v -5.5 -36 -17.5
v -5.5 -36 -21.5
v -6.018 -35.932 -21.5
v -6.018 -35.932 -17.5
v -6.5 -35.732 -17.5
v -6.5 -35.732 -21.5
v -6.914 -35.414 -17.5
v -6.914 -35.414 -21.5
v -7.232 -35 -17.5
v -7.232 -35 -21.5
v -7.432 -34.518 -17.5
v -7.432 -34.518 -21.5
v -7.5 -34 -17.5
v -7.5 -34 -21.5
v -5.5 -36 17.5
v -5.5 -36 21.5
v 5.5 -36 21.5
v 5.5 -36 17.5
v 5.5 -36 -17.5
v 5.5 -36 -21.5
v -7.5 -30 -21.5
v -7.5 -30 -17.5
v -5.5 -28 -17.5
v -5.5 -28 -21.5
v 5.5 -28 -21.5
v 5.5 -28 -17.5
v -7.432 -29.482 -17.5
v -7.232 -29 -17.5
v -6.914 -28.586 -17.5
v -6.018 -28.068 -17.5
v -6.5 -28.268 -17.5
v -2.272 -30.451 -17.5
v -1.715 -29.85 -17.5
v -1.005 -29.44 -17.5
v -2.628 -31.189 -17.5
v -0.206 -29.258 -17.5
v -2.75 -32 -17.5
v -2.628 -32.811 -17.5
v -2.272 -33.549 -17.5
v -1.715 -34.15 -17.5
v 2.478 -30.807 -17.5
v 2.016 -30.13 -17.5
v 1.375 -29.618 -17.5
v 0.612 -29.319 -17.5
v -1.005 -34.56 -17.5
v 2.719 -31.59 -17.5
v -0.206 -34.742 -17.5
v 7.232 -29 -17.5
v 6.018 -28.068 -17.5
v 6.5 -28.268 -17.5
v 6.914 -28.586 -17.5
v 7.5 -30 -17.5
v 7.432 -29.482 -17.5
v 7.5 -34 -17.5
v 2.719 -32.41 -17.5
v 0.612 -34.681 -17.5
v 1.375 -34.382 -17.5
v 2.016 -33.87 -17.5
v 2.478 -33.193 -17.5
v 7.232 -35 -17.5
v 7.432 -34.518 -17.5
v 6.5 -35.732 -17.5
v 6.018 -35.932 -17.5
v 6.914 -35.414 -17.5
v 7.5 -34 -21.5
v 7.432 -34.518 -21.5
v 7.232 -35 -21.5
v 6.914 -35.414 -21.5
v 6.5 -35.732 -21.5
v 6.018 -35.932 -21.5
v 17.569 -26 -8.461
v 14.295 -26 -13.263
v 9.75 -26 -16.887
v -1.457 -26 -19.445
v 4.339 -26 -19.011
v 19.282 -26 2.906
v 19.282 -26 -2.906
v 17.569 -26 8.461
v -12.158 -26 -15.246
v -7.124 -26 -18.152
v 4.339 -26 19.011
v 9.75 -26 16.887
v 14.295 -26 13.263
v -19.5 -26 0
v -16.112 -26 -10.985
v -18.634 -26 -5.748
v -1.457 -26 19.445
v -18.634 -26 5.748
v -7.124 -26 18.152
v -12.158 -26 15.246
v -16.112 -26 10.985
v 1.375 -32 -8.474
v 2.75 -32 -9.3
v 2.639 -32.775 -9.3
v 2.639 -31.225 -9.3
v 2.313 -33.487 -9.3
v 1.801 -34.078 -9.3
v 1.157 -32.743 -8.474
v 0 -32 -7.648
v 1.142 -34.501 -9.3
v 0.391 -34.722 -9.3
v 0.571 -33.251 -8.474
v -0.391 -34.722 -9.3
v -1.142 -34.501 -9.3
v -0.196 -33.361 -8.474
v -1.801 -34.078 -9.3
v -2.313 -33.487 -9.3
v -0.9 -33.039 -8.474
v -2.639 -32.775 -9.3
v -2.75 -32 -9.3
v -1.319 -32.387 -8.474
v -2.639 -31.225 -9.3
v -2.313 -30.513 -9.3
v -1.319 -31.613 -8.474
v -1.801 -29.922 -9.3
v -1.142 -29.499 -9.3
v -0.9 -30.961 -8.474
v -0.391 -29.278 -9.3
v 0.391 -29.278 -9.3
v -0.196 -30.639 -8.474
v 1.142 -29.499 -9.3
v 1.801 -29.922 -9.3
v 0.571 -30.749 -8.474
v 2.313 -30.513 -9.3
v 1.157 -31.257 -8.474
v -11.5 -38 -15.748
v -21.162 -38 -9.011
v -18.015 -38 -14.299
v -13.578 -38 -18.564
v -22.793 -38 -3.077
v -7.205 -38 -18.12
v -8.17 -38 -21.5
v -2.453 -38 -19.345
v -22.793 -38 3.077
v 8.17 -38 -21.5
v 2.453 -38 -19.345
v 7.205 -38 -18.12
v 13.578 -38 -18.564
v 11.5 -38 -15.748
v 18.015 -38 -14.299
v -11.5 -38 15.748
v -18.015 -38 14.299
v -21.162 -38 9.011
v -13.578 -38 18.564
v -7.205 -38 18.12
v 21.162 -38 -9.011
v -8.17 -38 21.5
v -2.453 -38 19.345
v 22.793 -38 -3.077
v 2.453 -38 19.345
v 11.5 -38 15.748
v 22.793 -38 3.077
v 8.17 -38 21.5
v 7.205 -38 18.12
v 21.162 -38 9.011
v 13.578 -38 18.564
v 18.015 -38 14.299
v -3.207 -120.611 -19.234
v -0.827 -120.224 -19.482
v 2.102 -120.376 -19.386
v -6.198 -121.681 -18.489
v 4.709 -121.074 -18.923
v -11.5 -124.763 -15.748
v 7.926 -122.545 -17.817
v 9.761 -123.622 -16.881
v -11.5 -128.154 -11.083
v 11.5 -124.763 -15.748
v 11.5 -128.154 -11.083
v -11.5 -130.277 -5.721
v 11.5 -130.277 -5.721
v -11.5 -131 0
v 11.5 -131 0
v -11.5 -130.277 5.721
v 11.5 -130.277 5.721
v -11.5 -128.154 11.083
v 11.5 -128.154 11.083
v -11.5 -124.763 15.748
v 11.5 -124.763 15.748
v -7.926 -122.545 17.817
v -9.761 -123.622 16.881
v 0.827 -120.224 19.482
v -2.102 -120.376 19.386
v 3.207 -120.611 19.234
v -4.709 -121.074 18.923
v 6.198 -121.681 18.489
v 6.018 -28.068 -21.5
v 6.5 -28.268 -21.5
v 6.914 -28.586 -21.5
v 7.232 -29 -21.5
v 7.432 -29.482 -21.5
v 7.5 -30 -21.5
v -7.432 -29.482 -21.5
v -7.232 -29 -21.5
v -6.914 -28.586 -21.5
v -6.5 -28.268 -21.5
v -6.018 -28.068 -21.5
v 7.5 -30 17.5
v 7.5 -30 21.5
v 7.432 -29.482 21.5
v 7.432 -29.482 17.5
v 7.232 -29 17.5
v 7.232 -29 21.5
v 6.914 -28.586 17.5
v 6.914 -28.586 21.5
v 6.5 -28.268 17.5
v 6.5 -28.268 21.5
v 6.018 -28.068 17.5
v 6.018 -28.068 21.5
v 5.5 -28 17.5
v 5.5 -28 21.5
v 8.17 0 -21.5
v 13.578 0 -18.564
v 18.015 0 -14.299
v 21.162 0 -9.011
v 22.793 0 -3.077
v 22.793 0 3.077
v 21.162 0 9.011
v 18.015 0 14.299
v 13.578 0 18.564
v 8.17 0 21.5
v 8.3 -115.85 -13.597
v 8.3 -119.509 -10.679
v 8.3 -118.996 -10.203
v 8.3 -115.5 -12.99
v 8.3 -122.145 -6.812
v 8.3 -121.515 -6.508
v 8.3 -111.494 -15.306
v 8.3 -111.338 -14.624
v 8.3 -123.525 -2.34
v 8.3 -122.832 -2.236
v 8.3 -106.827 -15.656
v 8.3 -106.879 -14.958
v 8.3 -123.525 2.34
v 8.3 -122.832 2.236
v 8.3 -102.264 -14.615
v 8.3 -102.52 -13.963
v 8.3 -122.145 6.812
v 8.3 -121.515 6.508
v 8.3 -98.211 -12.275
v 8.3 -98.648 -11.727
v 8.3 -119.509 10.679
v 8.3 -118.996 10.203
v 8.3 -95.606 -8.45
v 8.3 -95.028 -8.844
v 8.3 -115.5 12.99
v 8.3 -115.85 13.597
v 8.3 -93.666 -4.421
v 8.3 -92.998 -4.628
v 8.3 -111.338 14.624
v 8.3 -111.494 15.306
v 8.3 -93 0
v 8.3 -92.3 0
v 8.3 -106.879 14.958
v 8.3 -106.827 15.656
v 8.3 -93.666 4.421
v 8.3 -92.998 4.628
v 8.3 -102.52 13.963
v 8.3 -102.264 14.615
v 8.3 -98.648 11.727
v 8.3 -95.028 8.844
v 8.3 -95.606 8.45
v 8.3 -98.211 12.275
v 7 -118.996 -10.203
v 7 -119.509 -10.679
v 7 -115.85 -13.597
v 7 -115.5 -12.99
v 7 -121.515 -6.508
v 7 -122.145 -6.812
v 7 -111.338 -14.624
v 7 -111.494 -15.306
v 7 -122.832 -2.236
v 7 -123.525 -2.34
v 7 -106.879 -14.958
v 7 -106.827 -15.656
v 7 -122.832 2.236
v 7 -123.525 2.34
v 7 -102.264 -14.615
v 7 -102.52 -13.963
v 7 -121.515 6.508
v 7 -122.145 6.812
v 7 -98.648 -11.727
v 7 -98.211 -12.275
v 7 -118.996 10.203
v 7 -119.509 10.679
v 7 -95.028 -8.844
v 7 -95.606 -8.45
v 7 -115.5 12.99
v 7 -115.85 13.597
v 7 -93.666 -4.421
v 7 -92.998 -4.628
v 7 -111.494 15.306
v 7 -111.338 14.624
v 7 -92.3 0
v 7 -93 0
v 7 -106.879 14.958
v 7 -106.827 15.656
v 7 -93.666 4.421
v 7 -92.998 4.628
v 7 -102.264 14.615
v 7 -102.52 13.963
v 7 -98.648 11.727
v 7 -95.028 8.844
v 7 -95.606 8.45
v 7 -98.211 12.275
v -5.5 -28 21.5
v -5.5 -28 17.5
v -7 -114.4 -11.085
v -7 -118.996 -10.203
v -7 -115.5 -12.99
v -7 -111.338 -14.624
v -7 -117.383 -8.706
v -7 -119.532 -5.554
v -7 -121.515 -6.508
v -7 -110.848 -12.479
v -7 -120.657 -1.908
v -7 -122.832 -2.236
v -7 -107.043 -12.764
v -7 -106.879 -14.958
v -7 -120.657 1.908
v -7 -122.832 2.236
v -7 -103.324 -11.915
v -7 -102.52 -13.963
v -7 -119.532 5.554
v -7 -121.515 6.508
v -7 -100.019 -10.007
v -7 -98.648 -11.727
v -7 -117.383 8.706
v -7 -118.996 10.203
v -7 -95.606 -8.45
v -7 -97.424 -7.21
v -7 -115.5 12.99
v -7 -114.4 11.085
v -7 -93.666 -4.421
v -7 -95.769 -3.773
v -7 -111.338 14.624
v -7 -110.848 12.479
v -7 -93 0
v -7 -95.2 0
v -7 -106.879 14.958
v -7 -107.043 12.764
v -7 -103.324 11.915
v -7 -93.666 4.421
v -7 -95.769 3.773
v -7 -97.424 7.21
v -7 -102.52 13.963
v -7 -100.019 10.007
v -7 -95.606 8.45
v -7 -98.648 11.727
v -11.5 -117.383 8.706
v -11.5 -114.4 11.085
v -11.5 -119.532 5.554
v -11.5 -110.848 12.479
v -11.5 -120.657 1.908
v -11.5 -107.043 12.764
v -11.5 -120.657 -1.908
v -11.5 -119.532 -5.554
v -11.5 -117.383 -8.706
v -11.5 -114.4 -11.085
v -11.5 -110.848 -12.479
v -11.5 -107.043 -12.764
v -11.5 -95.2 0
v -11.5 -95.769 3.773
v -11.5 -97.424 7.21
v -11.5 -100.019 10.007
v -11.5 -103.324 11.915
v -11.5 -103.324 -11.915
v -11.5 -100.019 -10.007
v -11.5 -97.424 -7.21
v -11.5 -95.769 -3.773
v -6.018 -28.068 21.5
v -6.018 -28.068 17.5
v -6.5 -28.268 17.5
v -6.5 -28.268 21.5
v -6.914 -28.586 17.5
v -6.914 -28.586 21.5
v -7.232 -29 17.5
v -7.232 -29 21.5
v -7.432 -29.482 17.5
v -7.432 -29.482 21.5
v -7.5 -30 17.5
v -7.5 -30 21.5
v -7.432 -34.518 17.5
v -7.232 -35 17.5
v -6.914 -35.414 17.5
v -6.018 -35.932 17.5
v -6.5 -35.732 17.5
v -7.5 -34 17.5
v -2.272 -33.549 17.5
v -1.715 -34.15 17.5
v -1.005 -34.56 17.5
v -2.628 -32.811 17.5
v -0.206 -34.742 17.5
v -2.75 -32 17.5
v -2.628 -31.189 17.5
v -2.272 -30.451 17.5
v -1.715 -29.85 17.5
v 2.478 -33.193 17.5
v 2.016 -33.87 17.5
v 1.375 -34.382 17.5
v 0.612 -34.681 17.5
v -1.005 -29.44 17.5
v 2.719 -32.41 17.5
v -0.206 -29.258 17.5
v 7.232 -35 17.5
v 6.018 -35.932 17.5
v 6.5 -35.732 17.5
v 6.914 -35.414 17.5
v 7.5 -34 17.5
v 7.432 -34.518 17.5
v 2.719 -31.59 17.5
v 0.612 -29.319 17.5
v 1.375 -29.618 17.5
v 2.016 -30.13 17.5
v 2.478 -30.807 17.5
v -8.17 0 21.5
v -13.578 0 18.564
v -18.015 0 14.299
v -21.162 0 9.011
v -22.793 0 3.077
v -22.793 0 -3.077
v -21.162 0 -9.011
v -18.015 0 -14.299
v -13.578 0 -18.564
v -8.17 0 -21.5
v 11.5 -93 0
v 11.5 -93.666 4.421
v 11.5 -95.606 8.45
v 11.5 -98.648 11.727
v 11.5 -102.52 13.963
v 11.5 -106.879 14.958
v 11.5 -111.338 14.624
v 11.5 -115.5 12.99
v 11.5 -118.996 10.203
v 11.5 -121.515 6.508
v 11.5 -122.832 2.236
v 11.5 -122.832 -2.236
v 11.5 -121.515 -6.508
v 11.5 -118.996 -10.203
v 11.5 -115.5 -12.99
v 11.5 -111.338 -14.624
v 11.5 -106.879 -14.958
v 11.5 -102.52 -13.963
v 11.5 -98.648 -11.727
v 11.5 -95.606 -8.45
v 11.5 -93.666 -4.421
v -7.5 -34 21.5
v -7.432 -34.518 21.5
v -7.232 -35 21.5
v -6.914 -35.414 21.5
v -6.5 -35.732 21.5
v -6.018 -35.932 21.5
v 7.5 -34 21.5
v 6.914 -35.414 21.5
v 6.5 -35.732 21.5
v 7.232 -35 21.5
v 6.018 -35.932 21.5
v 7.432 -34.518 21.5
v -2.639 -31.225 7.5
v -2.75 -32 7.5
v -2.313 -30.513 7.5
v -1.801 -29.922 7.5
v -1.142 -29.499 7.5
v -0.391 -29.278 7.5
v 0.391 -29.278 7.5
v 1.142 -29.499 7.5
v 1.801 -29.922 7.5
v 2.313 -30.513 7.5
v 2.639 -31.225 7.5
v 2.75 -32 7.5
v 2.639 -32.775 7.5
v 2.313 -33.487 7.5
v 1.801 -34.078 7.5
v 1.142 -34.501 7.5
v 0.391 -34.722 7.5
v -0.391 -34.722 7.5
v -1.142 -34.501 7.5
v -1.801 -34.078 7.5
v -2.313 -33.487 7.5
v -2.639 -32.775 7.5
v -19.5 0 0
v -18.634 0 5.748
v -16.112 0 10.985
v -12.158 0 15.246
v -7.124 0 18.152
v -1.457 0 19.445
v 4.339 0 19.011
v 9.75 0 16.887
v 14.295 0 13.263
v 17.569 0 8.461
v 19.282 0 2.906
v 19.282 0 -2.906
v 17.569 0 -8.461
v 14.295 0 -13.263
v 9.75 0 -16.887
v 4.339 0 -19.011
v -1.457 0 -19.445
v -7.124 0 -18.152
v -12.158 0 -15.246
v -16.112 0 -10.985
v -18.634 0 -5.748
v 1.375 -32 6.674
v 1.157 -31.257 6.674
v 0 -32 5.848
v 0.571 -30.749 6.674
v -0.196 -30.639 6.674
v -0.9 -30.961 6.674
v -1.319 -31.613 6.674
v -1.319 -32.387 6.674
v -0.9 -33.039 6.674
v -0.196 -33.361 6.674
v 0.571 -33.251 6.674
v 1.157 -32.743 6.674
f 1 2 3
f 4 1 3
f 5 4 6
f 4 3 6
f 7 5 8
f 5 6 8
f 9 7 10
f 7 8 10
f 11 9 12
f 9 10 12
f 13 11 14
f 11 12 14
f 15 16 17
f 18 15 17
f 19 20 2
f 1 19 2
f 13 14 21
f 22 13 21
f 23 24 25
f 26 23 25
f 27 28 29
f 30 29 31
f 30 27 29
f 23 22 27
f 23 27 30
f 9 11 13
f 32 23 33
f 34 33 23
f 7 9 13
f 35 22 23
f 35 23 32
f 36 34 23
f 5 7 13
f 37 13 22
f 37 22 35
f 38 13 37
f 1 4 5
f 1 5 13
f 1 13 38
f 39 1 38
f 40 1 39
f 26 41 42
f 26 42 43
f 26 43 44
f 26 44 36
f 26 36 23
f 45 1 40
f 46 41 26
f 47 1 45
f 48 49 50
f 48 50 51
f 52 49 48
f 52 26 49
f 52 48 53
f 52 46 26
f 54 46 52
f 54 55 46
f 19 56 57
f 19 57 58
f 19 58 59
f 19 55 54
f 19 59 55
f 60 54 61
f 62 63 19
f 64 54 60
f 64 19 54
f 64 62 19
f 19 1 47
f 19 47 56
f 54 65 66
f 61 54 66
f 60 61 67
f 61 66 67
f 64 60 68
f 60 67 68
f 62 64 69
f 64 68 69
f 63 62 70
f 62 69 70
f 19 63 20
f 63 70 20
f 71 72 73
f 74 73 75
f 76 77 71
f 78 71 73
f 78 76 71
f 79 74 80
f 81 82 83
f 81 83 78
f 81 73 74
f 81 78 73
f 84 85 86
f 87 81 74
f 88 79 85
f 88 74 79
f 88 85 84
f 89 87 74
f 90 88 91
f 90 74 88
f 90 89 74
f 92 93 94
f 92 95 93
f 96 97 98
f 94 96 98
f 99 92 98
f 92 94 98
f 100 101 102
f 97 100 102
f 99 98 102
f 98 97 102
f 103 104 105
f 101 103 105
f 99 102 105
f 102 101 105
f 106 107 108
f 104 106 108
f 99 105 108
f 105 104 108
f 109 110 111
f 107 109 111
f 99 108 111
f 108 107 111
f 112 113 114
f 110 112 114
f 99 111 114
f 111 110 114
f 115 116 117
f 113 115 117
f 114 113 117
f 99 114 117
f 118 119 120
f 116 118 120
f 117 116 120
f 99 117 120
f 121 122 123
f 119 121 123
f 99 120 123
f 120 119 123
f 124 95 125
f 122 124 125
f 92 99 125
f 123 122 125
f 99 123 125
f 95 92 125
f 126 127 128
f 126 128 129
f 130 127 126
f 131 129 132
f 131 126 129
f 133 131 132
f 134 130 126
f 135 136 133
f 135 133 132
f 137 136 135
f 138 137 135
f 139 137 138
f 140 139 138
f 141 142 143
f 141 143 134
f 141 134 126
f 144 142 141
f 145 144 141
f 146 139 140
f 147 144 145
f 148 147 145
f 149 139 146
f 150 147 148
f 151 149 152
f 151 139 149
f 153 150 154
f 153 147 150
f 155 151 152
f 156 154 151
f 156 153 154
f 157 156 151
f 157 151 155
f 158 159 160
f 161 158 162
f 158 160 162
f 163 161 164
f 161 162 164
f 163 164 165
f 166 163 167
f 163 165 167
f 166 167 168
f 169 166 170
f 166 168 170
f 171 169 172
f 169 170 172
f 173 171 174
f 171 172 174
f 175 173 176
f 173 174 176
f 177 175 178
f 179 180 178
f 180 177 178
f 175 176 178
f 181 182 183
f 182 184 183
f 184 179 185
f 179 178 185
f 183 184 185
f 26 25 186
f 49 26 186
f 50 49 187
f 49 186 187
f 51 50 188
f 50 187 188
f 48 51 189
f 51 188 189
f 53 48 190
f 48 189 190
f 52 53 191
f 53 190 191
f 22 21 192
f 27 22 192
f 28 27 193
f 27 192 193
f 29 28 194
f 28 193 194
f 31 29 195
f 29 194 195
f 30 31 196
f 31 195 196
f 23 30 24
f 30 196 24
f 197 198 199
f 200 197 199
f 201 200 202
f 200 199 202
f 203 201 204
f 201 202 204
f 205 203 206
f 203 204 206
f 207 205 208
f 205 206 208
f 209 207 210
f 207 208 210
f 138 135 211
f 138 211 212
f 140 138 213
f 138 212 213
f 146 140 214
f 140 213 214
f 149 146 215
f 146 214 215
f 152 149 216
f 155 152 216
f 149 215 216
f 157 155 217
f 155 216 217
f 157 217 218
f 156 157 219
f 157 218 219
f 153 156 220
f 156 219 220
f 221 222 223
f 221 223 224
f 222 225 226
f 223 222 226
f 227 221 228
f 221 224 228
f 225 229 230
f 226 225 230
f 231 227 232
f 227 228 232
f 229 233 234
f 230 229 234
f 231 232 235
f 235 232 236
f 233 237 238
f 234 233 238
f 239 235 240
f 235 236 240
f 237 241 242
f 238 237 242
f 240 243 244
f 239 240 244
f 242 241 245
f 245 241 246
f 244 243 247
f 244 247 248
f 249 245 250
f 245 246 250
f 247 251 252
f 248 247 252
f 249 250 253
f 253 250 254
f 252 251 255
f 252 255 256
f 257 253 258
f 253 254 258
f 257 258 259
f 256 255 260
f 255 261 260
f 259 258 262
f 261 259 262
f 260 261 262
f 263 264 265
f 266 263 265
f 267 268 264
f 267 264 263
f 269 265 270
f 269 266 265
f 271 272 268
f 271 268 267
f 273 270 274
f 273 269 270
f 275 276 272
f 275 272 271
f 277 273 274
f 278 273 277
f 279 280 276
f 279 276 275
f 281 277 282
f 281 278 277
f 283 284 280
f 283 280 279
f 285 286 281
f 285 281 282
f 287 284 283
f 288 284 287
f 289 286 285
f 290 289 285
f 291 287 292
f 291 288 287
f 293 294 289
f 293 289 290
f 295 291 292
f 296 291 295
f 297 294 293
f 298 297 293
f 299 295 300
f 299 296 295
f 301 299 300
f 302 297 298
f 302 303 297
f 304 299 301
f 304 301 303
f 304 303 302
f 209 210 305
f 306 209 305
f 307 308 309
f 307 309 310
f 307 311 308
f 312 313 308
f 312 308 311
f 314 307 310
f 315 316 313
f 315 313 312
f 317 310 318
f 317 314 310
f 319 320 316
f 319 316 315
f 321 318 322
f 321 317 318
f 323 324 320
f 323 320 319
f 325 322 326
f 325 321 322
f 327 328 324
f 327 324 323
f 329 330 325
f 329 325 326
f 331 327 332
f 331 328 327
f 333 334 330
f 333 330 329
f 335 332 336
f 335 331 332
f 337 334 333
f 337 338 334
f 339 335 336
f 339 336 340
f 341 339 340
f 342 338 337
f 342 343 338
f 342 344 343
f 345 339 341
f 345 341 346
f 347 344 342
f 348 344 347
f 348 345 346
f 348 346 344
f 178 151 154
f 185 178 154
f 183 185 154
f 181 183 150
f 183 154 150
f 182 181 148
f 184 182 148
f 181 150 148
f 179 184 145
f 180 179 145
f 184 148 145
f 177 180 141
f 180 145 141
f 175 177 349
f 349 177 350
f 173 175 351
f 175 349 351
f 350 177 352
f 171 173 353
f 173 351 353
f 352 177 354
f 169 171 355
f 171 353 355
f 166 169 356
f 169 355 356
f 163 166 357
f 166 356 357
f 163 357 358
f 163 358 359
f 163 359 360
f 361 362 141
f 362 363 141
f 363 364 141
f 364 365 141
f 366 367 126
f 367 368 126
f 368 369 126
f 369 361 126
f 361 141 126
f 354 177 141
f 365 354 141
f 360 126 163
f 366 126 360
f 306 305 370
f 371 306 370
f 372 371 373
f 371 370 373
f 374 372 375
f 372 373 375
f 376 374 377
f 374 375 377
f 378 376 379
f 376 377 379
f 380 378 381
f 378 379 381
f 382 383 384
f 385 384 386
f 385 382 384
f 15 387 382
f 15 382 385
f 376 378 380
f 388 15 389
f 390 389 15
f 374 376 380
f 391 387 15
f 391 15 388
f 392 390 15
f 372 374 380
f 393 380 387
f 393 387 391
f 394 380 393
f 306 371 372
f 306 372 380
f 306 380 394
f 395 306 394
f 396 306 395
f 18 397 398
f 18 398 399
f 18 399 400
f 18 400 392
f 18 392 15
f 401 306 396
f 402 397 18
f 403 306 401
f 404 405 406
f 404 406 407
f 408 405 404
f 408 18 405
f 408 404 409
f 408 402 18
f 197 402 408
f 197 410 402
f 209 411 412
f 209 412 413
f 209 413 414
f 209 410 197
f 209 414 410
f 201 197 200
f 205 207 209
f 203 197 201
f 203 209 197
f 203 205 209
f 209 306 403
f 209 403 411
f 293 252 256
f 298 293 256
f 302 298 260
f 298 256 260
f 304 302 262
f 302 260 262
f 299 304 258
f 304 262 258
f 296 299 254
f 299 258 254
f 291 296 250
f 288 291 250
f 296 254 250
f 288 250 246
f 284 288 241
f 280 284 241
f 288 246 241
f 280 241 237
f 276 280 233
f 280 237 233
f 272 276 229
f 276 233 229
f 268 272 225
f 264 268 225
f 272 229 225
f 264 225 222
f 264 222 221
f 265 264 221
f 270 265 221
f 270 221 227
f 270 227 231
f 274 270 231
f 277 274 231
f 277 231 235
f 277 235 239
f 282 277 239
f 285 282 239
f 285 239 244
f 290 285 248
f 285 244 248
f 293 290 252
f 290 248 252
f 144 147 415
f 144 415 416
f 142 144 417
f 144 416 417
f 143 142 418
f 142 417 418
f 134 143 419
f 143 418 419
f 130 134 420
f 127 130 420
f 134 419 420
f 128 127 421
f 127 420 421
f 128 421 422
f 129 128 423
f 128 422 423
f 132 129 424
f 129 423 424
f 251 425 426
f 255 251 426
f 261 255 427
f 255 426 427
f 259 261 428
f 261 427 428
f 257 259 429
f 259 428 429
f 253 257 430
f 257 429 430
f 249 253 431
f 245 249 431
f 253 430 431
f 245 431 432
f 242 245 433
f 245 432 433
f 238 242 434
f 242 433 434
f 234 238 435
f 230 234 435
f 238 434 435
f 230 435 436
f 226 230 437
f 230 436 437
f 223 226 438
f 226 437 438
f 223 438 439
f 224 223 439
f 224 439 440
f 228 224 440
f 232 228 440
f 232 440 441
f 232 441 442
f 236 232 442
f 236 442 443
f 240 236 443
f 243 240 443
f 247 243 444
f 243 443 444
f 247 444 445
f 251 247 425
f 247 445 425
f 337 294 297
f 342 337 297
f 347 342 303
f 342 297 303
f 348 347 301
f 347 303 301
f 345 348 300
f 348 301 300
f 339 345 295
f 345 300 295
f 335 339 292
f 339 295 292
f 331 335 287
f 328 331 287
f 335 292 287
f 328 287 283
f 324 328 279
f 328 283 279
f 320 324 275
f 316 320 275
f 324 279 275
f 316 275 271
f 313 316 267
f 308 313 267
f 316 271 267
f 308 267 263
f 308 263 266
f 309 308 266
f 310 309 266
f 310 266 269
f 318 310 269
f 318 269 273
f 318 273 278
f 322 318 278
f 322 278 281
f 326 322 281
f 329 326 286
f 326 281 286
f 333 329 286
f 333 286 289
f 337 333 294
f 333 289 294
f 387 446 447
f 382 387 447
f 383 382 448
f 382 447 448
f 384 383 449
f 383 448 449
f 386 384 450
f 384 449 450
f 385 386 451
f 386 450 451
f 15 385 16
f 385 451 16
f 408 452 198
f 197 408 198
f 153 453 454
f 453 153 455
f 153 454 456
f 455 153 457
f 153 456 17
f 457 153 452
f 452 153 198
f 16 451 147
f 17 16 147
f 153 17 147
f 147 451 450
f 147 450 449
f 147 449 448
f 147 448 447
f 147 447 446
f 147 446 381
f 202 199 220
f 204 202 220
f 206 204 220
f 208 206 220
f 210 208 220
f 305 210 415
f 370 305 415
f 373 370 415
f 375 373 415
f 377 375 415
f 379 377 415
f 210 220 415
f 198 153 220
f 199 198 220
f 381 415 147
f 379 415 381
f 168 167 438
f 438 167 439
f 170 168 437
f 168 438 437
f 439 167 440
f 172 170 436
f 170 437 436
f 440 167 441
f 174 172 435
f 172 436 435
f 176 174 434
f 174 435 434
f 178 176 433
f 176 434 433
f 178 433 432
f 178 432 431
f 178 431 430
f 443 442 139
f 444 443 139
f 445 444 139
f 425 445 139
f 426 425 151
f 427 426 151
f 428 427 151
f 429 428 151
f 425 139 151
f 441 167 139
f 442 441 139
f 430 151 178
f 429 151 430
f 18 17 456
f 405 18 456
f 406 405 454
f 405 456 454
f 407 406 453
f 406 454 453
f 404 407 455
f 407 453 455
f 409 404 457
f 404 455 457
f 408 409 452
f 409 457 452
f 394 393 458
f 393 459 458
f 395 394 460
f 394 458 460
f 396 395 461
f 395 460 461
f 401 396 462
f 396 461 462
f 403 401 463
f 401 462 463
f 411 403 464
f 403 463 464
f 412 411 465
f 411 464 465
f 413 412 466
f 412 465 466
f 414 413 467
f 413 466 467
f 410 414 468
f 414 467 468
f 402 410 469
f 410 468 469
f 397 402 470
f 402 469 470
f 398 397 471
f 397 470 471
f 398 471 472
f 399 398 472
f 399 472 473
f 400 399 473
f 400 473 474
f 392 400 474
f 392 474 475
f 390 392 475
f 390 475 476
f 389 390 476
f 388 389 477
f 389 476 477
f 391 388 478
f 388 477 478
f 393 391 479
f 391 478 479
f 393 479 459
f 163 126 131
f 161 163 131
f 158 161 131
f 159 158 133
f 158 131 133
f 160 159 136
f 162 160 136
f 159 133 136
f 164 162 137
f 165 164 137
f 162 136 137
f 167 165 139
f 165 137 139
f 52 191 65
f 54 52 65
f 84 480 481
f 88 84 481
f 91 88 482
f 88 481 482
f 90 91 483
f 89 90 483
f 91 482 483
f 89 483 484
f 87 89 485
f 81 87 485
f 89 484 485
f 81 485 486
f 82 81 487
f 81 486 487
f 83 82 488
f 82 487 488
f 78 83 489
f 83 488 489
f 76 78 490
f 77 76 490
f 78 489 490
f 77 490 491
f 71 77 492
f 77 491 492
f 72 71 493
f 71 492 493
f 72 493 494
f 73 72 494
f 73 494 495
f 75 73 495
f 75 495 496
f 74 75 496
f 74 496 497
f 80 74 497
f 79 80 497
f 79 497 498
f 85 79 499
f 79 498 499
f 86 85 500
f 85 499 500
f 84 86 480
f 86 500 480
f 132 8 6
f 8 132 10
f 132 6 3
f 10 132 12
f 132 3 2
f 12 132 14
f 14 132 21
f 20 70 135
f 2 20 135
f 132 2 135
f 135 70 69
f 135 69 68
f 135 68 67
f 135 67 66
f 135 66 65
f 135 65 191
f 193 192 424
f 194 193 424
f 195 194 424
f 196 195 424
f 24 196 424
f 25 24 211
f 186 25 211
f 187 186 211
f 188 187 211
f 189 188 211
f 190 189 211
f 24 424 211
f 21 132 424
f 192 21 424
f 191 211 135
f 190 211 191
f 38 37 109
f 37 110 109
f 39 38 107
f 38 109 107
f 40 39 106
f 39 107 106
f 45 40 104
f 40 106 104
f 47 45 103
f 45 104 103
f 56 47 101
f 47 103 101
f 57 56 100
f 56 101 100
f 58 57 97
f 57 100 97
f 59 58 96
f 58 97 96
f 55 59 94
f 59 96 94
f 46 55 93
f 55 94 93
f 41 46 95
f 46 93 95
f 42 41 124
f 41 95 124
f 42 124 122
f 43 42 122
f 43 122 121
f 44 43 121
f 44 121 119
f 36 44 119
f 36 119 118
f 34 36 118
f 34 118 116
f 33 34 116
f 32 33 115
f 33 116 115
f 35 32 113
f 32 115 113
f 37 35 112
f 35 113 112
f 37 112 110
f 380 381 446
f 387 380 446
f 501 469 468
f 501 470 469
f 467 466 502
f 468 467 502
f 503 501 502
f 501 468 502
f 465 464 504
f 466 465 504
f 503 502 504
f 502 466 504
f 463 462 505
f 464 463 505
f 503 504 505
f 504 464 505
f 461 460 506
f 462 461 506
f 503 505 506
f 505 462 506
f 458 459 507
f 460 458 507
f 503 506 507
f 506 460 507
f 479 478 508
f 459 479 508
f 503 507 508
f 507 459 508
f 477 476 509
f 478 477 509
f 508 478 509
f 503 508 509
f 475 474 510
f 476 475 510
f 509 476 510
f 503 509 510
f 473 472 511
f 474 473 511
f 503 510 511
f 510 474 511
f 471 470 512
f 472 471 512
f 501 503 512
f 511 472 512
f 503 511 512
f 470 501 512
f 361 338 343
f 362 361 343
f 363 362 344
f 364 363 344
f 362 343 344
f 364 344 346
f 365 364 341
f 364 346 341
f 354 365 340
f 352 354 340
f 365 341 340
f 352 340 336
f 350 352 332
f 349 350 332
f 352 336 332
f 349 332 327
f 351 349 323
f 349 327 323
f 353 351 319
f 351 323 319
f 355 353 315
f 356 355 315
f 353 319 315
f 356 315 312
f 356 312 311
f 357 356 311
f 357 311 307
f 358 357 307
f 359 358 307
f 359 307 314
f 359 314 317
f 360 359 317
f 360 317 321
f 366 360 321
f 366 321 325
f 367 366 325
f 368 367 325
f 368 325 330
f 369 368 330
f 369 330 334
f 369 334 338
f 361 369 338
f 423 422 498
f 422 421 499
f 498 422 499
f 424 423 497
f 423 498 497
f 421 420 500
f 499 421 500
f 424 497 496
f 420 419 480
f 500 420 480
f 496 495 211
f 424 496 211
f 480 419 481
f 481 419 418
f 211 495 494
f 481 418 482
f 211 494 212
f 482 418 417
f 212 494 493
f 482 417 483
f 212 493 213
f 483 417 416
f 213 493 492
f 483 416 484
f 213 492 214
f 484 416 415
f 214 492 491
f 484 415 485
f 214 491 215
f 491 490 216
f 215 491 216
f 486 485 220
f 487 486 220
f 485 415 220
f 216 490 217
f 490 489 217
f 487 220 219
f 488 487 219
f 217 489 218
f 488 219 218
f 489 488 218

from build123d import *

# Parameters (mm, degrees)
F1_DEPTH  = 38
F3_DEPTH  = 93
F5_DEPTH  = 34.501
F6_R      = 19.5
F7_DEPTH  = 26
F8_R      = 15
F9_DEPTH  = 3.2
F10_R     = 15.7
F11_DEPTH = 1.3
F12_R     = 15
F13_DEPTH = 14
F14_R     = 12.8
F15_DEPTH = 16.001
F17_DEPTH = 4
F19_D     = 5.5
F19_DEPTH = 10
F19_TIP   = 1.6523667023
F21_DEPTH = 4
F23_D     = 5.5
F23_DEPTH = 8.2
F23_TIP   = 1.6523667023


with BuildPart() as f1:
    # F0 (on Front) → F1 (new body)
    with BuildSketch(Plane.XZ):
        with BuildLine():
            Line((8.1700673192, 21.5), (-8.1700673192, 21.5))
            ThreePointArc((-8.1700673192, 21.5), (-23, 0), (-8.1700673192, -21.5))
            Line((-8.1700673192, -21.5), (8.1700673192, -21.5))
            ThreePointArc((8.1700673192, -21.5), (23, 0), (8.1700673192, 21.5))
        make_face()
    extrude(amount=F1_DEPTH)

    # F2 (on face) → F3 (join)
    with BuildSketch(Plane.XZ.offset(38)):
        with BuildLine():
            Line((-11.5, 15.748015748), (-11.5, -15.748015748))
            ThreePointArc((-11.5, -15.748015748), (0, -19.5), (11.5, -15.748015748))
            Line((11.5, -15.748015748), (11.5, 15.748015748))
            ThreePointArc((11.5, 15.748015748), (0, 19.5), (-11.5, 15.748015748))
        make_face()
    extrude(amount=F3_DEPTH)

    # F4 (on face) → F5 (cut, through all)
    with BuildSketch(Plane.YZ.offset(11.5)):
        with BuildLine():
            Line((-108.4063023692, 22.9964109892), (-107.5936976308, 22.9964109892))
            ThreePointArc((-107.5936976308, 22.9964109892), (-108, 23), (-108.4063023692, 22.9964109892))
        make_face()
        with BuildLine():
            ThreePointArc((-110.9123462287, -22.8148688237), (-130.9656634273, 1.256305435), (-108.4063023692, 22.9964109892))
            Line((-108.4063023692, 22.9964109892), (-137.5913057301, 22.9964109892))
            Line((-137.5913057301, 22.9964109892), (-137.5913057301, -22.410525009))
            Line((-137.5913057301, -22.410525009), (-110.9123462287, -22.8148688237))
        make_face()
    extrude(amount=-F5_DEPTH, mode=Mode.SUBTRACT)

    # F6 (on face) → F7 (cut)
    with BuildSketch(Plane(origin=(0, 0, 0), x_dir=(-1, 0, 0), z_dir=(0, 1, 0))):
        Circle(F6_R)
    extrude(amount=-F7_DEPTH, mode=Mode.SUBTRACT)

    # F8 (on face) → F9 (cut)
    with BuildSketch(Plane.YZ.offset(11.5)):
        with Locations((-108, 0)):
            Circle(F8_R)
    extrude(amount=-F9_DEPTH, mode=Mode.SUBTRACT)

    # F10 (on face) → F11 (cut)
    with BuildSketch(Plane.YZ.offset(8.3)):
        with Locations((-108, 0)):
            Circle(F10_R)
    extrude(amount=-F11_DEPTH, mode=Mode.SUBTRACT)

    # F12 (on face) → F13 (cut)
    with BuildSketch(Plane.YZ.offset(7)):
        with Locations((-108, 0)):
            Circle(F12_R)
    extrude(amount=-F13_DEPTH, mode=Mode.SUBTRACT)

    # F14 (on face) → F15 (cut, through all)
    with BuildSketch(Plane.YZ.offset(-7)):
        with Locations((-108, 0)):
            Circle(F14_R)
    extrude(amount=-F15_DEPTH, mode=Mode.SUBTRACT)

    # F16 (on face) → F17 (cut)
    with BuildSketch(Plane.XY.offset(21.5)):
        with BuildLine():
            Line((5.5, -28), (-5.5, -28))
            ThreePointArc((-5.5, -28), (-6.9142135624, -28.5857864376), (-7.5, -30))
            Line((-7.5, -30), (-7.5, -34))
            ThreePointArc((-7.5, -34), (-6.9142135624, -35.4142135624), (-5.5, -36))
            Line((-5.5, -36), (5.5, -36))
            ThreePointArc((5.5, -36), (6.9142135624, -35.4142135624), (7.5, -34))
            Line((7.5, -34), (7.5, -30))
            ThreePointArc((7.5, -30), (6.9142135624, -28.5857864376), (5.5, -28))
        make_face()
    extrude(amount=-F17_DEPTH, mode=Mode.SUBTRACT)

    # F19
    with Locations(Plane.XY.offset(17.5)):
        with Locations((0, -32)):
            Hole(F19_D / 2, depth=F19_DEPTH)
            with Locations((0, 0, -(F19_DEPTH + F19_TIP / 2))):  # 118° drill point
                Cone(0, F19_D / 2, F19_TIP, mode=Mode.SUBTRACT)

    # F20 (on face) → F21 (cut)
    with BuildSketch(Plane(origin=(0, 0, -21.5), x_dir=(1, 0, 0), z_dir=(0, 0, -1))):
        with BuildLine():
            Line((5.5, 36), (-5.5, 36))
            ThreePointArc((-5.5, 36), (-6.9142135624, 35.4142135624), (-7.5, 34))
            Line((-7.5, 34), (-7.5, 30))
            ThreePointArc((-7.5, 30), (-6.9142135624, 28.5857864376), (-5.5, 28))
            Line((-5.5, 28), (5.5, 28))
            ThreePointArc((5.5, 28), (6.9142135624, 28.5857864376), (7.5, 30))
            Line((7.5, 30), (7.5, 34))
            ThreePointArc((7.5, 34), (6.9142135624, 35.4142135624), (5.5, 36))
        make_face()
    extrude(amount=-F21_DEPTH, mode=Mode.SUBTRACT)

    # F23
    with Locations(Plane(origin=(0, 0, -17.5), x_dir=(1, 0, 0), z_dir=(0, 0, -1))):
        with Locations((0, 32)):
            Hole(F23_D / 2, depth=F23_DEPTH)
            with Locations((0, 0, -(F23_DEPTH + F23_TIP / 2))):  # 118° drill point
                Cone(0, F23_D / 2, F23_TIP, mode=Mode.SUBTRACT)


solid = f1.part
